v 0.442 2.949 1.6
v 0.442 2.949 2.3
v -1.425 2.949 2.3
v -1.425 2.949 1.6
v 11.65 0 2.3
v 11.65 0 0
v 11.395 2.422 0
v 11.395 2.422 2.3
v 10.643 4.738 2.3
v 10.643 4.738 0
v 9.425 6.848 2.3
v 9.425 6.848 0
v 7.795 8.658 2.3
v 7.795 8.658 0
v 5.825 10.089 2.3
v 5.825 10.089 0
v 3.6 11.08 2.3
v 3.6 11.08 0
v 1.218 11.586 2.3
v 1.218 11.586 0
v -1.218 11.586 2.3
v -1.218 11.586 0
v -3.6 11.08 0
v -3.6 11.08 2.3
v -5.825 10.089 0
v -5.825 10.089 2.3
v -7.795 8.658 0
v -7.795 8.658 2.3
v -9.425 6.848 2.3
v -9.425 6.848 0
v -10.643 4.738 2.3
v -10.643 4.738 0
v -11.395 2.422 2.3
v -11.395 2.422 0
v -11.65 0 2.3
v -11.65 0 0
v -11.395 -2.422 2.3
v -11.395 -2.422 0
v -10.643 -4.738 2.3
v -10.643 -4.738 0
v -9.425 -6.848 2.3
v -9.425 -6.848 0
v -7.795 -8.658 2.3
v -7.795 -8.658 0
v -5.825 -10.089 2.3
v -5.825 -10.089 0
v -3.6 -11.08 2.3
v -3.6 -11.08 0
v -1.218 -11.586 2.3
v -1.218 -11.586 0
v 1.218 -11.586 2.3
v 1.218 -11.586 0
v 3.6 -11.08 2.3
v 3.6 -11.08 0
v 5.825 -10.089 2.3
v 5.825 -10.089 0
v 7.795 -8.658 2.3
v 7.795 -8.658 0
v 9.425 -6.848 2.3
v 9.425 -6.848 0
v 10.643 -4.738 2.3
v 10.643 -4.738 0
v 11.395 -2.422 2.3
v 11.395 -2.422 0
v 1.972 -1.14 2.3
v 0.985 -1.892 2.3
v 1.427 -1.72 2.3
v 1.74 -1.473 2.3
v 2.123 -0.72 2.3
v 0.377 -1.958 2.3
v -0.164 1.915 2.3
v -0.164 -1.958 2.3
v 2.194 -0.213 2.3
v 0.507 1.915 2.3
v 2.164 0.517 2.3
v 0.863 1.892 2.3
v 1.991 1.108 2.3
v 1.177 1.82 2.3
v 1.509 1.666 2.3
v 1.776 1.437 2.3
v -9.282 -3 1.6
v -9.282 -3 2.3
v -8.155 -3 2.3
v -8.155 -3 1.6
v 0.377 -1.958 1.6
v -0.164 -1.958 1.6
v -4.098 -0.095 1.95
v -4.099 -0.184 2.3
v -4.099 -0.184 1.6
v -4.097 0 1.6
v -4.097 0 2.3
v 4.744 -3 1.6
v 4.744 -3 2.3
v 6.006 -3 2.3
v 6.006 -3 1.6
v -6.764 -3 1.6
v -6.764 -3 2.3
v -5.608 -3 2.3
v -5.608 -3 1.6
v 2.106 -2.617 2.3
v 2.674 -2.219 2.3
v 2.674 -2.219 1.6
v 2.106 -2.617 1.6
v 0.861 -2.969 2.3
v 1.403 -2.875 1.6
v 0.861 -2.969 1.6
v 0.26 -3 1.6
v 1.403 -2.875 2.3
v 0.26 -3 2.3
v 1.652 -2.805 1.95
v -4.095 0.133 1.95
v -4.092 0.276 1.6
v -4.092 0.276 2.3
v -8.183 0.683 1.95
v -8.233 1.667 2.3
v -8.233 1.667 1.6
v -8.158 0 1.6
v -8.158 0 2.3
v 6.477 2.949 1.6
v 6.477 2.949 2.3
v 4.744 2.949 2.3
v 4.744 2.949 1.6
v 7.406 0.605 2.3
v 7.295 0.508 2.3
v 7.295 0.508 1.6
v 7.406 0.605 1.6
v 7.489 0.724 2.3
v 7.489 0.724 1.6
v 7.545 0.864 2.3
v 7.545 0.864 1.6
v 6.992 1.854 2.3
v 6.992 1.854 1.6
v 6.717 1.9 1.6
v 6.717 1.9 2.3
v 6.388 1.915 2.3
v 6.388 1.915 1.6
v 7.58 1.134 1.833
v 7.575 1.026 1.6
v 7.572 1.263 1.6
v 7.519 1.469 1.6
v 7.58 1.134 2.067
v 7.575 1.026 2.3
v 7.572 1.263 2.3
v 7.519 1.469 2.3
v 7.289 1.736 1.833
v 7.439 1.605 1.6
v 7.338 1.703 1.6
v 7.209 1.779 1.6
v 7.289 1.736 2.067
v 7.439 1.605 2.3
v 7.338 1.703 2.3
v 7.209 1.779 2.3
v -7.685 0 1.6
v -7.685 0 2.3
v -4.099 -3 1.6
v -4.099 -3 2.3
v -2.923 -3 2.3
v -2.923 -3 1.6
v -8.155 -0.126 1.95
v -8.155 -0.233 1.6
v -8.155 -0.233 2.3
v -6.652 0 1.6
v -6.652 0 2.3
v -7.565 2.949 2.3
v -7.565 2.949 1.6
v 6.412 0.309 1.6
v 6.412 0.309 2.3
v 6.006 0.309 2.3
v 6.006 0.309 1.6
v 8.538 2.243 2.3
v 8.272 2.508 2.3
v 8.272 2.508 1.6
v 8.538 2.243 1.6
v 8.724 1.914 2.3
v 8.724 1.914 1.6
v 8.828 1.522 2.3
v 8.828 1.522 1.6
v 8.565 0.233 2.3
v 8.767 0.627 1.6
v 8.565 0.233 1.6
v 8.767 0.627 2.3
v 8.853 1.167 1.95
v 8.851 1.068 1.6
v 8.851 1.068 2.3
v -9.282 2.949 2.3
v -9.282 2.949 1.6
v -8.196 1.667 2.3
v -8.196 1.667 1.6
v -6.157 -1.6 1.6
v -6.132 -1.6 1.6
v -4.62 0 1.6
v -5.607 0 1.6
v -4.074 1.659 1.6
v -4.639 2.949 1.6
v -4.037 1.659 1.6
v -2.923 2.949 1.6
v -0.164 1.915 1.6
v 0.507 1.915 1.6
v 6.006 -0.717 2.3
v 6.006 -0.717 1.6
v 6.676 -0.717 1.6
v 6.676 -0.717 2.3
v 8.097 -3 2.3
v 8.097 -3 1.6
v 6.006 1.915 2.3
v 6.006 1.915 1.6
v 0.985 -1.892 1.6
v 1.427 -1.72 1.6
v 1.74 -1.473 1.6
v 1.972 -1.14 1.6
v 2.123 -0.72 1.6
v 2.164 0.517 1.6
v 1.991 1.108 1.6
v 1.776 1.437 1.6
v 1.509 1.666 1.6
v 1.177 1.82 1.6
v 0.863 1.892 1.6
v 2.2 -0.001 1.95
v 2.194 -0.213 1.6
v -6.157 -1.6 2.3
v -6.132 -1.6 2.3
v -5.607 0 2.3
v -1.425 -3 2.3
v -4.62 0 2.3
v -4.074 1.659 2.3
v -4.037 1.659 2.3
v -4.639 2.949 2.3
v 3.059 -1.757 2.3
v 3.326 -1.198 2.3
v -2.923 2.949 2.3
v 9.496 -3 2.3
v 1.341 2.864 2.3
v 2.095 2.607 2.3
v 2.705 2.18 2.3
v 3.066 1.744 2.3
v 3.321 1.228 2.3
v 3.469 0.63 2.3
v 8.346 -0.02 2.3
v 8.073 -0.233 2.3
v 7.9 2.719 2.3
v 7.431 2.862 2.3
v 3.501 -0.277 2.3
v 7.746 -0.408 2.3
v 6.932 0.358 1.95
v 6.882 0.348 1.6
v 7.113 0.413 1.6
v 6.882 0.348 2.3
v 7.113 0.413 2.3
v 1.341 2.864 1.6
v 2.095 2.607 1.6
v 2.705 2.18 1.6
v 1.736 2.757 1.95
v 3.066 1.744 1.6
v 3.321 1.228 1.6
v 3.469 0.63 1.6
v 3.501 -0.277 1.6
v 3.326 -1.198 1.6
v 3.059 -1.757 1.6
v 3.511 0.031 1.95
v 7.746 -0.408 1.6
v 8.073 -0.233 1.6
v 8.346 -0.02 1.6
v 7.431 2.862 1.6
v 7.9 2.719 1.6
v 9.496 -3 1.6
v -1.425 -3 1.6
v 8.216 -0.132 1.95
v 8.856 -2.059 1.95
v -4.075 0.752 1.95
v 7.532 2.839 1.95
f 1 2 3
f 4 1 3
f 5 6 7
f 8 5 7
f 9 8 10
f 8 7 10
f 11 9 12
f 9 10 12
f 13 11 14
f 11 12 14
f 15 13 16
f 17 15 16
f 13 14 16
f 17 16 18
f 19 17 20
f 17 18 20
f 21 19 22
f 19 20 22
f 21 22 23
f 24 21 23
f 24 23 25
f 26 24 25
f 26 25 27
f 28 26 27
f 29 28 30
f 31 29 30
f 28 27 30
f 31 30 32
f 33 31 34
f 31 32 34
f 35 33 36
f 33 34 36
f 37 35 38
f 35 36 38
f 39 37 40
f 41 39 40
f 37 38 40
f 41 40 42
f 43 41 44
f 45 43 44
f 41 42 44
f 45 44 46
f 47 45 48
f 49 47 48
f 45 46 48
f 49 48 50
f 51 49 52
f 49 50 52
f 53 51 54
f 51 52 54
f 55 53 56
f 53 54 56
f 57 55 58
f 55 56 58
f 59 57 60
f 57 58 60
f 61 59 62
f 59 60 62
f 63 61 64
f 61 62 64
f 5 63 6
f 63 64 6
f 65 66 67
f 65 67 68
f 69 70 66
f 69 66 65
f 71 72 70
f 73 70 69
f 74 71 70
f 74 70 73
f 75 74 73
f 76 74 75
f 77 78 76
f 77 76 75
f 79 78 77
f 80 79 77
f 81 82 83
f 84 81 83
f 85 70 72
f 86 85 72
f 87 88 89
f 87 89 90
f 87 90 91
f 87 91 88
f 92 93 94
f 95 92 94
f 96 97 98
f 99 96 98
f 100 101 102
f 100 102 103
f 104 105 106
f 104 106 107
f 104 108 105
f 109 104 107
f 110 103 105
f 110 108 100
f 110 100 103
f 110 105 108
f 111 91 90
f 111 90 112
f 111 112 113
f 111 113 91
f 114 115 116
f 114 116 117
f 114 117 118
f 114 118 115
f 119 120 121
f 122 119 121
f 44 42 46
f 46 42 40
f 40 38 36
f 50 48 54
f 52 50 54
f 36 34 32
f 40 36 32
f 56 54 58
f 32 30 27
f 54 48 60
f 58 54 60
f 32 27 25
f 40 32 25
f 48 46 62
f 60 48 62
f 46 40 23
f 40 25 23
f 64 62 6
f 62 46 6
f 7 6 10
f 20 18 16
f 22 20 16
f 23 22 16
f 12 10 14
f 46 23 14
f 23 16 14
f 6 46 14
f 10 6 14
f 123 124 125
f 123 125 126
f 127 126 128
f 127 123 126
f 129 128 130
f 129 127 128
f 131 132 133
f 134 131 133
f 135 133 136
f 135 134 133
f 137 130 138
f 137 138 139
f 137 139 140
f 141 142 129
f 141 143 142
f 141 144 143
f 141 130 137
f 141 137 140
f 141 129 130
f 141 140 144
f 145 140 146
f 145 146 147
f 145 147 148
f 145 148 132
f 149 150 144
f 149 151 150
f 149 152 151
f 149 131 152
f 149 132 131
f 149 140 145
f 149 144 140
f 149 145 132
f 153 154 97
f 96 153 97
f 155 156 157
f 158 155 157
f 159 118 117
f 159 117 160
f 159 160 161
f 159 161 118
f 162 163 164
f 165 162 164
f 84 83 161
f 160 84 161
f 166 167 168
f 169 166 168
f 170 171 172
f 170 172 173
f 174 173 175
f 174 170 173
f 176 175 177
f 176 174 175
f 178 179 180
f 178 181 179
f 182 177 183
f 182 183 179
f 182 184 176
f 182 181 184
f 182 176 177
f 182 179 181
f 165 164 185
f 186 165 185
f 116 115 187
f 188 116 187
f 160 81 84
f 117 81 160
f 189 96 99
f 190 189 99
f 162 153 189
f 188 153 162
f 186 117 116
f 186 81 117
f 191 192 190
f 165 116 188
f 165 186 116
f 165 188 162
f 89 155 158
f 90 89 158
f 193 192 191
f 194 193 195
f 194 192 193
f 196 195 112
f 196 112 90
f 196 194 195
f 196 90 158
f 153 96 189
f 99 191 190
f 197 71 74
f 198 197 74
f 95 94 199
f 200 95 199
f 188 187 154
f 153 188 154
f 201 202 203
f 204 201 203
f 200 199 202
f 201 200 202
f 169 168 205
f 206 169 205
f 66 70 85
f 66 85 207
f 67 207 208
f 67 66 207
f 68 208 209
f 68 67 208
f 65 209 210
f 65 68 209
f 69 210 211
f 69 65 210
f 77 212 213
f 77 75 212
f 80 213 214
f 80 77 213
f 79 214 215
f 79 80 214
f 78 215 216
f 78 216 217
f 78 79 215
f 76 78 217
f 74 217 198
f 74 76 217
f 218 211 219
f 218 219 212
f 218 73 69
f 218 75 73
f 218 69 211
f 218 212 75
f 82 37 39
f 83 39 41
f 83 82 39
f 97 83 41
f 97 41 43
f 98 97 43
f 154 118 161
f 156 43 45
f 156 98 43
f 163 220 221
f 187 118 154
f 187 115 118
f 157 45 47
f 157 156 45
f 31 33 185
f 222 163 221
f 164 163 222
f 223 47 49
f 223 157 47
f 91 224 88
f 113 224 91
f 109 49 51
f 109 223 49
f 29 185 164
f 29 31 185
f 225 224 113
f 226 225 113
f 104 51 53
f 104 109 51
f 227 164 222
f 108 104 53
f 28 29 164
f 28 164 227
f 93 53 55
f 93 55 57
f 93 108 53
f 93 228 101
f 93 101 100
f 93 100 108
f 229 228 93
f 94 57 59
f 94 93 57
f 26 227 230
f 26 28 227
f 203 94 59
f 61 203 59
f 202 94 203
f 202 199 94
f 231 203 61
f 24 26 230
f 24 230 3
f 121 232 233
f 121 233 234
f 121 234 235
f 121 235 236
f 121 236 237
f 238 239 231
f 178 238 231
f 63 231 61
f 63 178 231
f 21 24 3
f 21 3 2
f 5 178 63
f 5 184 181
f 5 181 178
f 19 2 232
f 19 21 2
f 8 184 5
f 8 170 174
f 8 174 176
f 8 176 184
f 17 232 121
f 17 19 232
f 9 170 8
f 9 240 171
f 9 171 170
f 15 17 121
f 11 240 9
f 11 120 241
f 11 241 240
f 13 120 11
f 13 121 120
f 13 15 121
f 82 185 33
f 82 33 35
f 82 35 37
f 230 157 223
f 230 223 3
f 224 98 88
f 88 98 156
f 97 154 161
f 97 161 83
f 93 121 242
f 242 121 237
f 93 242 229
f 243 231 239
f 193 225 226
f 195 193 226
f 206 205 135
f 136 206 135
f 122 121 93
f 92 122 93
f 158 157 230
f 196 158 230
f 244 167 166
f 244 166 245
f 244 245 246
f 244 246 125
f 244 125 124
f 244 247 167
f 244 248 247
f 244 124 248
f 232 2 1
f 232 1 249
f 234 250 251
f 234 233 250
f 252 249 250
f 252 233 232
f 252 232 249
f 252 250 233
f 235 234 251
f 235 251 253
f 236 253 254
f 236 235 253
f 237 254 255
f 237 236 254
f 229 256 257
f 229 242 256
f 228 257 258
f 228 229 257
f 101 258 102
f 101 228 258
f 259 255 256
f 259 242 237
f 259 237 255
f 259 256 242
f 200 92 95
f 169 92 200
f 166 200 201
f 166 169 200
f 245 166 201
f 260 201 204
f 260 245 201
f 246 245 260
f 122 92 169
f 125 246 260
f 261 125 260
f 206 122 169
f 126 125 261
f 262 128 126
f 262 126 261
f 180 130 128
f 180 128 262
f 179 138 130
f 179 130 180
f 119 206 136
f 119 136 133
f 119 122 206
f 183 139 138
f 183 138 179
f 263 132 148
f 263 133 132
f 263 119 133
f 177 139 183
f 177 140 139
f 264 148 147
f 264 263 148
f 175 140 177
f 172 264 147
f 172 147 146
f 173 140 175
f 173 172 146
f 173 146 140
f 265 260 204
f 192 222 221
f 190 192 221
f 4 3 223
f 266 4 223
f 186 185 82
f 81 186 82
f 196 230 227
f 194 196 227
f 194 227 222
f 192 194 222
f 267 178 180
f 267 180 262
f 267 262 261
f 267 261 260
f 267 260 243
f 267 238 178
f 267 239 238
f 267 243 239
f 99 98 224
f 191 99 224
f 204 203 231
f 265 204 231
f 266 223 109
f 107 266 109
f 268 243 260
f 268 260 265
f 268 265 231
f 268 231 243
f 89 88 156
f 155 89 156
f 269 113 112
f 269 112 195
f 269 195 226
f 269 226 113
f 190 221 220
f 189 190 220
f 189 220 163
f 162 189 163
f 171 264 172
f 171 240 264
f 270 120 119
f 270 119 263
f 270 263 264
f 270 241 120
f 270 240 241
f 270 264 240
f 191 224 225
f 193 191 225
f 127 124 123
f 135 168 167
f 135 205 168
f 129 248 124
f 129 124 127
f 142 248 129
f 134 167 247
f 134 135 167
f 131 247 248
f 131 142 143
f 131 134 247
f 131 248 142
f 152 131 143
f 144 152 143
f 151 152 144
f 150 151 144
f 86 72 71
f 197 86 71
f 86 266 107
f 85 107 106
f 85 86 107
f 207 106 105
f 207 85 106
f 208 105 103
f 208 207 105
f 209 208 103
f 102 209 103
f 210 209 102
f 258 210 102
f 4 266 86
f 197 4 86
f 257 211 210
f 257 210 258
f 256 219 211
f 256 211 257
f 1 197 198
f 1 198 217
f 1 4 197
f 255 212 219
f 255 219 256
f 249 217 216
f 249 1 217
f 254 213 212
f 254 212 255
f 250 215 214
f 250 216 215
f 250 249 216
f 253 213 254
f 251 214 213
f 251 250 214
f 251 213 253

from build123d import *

# Parameters (mm, degrees)
F0_R     = 11.65
F1_DEPTH = 2.3
F3_DEPTH = 0.7


with BuildPart() as f1:
    # F0 (on Top) → F1 (new body)
    with BuildSketch(Plane.XY):
        Circle(F0_R)
    extrude(amount=F1_DEPTH)

    # F2 (on face) → F3 (cut)
    with BuildSketch(Plane.XY.offset(2.3)):
        with BuildLine():
            Line((-9.2821657193, 2.94921875), (-9.2821657193, 0))
            Line((-9.2821657193, 0), (-8.1577947596, 0))
            add(Edge.make_bspline(
                [(-8.2326865526, 1.6666666667), (-8.1704547679, 0.5330109879), (-8.1577947596, 0)],
                knots=[0, 0, 0, 0.7965668448, 0.7965668448, 0.7965668448], degree=2))
            Line((-8.2326865526, 1.6666666667), (-8.1962282193, 1.6666666667))
            Line((-8.1962282193, 1.6666666667), (-7.6846954812, 0))
            Line((-7.6846954812, 0), (-6.6522663233, 0))
            Line((-6.6522663233, 0), (-7.5647178026, 2.94921875))
            Line((-7.5647178026, 2.94921875), (-9.2821657193, 2.94921875))
        make_face()
        with BuildLine():
            Line((-8.1577947596, 0), (-9.2821657193, 0))
            Line((-9.2821657193, 0), (-9.2821657193, -3))
            Line((-9.2821657193, -3), (-8.1545615526, -3))
            Line((-8.1545615526, -3), (-8.1545615526, -0.2330729167))
            add(Edge.make_bspline(
                [(-8.1577947596, 0), (-8.1545615526, -0.1361243036), (-8.1545615526, -0.2330729167)],
                knots=[0.7965668448, 0.7965668448, 0.7965668448, 1, 1, 1], degree=2))
        make_face()
        Polygon((-5.6076865526, -3), (-4.6199839255, 0), (-5.607097373, 0), (-6.132426136, -1.6002604167), (-6.1571657193, -1.6002604167), (-6.6522663233, 0), (-7.6846954812, 0), (-6.7639365526, -3), align=None)
        with BuildLine():
            Line((-4.0973563741, 0), (-2.9227907193, 0))
            Line((-2.9227907193, 0), (-2.9227907193, 2.94921875))
            Line((-2.9227907193, 2.94921875), (-4.6389365526, 2.94921875))
            Line((-4.6389365526, 2.94921875), (-5.607097373, 0))
            Line((-5.607097373, 0), (-4.6199839255, 0))
            Line((-4.6199839255, 0), (-4.073832386, 1.6588541667))
            Line((-4.073832386, 1.6588541667), (-4.0373740526, 1.6588541667))
            add(Edge.make_bspline(
                [(-4.0920615526, 0.2760416667), (-4.085551136, 0.5364583333), (-4.0373740526, 1.6588541667)],
                knots=[0, 0, 0, 1, 1, 1], degree=2))
            add(Edge.make_bspline(
                [(-4.0973563741, 0), (-4.0957587805, 0.1281525523), (-4.0920615526, 0.2760416667)],
                knots=[0.432105801, 0.432105801, 0.432105801, 1, 1, 1], degree=2))
        make_face()
        with BuildLine():
            Line((-2.9227907193, -3), (-2.9227907193, 0))
            Line((-2.9227907193, 0), (-4.0973563741, 0))
            add(Edge.make_bspline(
                [(-4.0985719693, -0.18359375), (-4.0985719693, -0.0975101725), (-4.0973563741, 0)],
                knots=[0, 0, 0, 0.432105801, 0.432105801, 0.432105801], degree=2))
            Line((-4.0985719693, -0.18359375), (-4.0985719693, -3))
            Line((-4.0985719693, -3), (-2.9227907193, -3))
        make_face()
        Polygon((-1.425394886, 0), (-0.163676136, 0), (-0.163676136, 1.9153645833), (0, 1.9153645833), (0, 2.94921875), (-1.425394886, 2.94921875), align=None)
        with BuildLine():
            Line((-0.163676136, -1.9583333333), (-0.163676136, 0))
            Line((-0.163676136, 0), (-1.425394886, 0))
            Line((-1.425394886, 0), (-1.425394886, -3))
            Line((-1.425394886, -3), (0.2595009474, -3))
            add(Edge.make_bspline(
                [(2.674214489, -2.21875), (1.8376259474, -3), (0.2595009474, -3)],
                knots=[0, 0, 0, 1, 1, 1], degree=2))
            add(Edge.make_bspline(
                [(3.5108030307, 0.03125), (3.5108030307, -1.4375), (2.674214489, -2.21875)],
                knots=[0, 0, 0, 1, 1, 1], degree=2))
            add(Edge.make_bspline(
                [(2.7048134474, 2.1803385417), (3.5108030307, 1.4114583333), (3.5108030307, 0.03125)],
                knots=[0, 0, 0, 1, 1, 1], degree=2))
            add(Edge.make_bspline(
                [(0.441792614, 2.94921875), (1.898823864, 2.94921875), (2.7048134474, 2.1803385417)],
                knots=[0, 0, 0, 1, 1, 1], degree=2))
            Line((0.441792614, 2.94921875), (0, 2.94921875))
            Line((0, 2.94921875), (0, 1.9153645833))
            Line((0, 1.9153645833), (0.5068967807, 1.9153645833))
            add(Edge.make_bspline(
                [(2.199605114, -0.0013020833), (2.199605114, 1.9153645833), (0.5068967807, 1.9153645833)],
                knots=[0, 0, 0, 1, 1, 1], degree=2))
            add(Edge.make_bspline(
                [(0.3766884474, -1.9583333333), (2.199605114, -1.9583333333), (2.199605114, -0.0013020833)],
                knots=[0, 0, 0, 1, 1, 1], degree=2))
            Line((0.3766884474, -1.9583333333), (-0.163676136, -1.9583333333))
        make_face()
        with BuildLine():
            Line((6.0055946974, -3), (6.0055946974, -0.7174479167))
            Line((6.0055946974, -0.7174479167), (6.676167614, -0.7174479167))
            Line((6.676167614, -0.7174479167), (8.0967405307, -3))
            Line((8.0967405307, -3), (9.496480114, -3))
            add(Edge.make_bspline(
                [(7.746480114, -0.4075520833), (9.090230114, -2.4140625), (9.496480114, -3)],
                knots=[0, 0, 0, 1, 1, 1], degree=2))
            add(Edge.make_bspline(
                [(8.564839489, 0.2330729167), (8.2764280307, -0.17578125), (7.746480114, -0.4075520833)],
                knots=[0, 0, 0, 1, 1, 1], degree=2))
            add(Edge.make_bspline(
                [(8.8532509474, 1.1666666667), (8.8532509474, 0.6419270833), (8.564839489, 0.2330729167)],
                knots=[0, 0, 0, 1, 1, 1], degree=2))
            add(Edge.make_bspline(
                [(8.271870739, 2.5078125), (8.8532509474, 2.06640625), (8.8532509474, 1.1666666667)],
                knots=[0, 0, 0, 1, 1, 1], degree=2))
            add(Edge.make_bspline(
                [(6.476948864, 2.94921875), (7.6904905307, 2.94921875), (8.271870739, 2.5078125)],
                knots=[0, 0, 0, 1, 1, 1], degree=2))
            Line((6.476948864, 2.94921875), (4.7438759474, 2.94921875))
            Line((4.7438759474, 2.94921875), (4.7438759474, -3))
            Line((4.7438759474, -3), (6.0055946974, -3))
        make_face()
        with BuildLine():
            Line((6.4118446974, 0.30859375), (6.0055946974, 0.30859375))
            Line((6.0055946974, 0.30859375), (6.0055946974, 1.9153645833))
            Line((6.0055946974, 1.9153645833), (6.3884071974, 1.9153645833))
            add(Edge.make_bspline(
                [(7.2887978224, 1.736328125), (6.9977821974, 1.9153645833), (6.3884071974, 1.9153645833)],
                knots=[0, 0, 0, 1, 1, 1], degree=2))
            add(Edge.make_bspline(
                [(7.5798134474, 1.1341145833), (7.5798134474, 1.5572916667), (7.2887978224, 1.736328125)],
                knots=[0, 0, 0, 1, 1, 1], degree=2))
            add(Edge.make_bspline(
                [(7.295308239, 0.5078125), (7.5798134474, 0.70703125), (7.5798134474, 1.1341145833)],
                knots=[0, 0, 0, 1, 1, 1], degree=2))
            add(Edge.make_bspline(
                [(6.4118446974, 0.30859375), (7.0108030307, 0.30859375), (7.295308239, 0.5078125)],
                knots=[0, 0, 0, 1, 1, 1], degree=2))
        make_face(mode=Mode.SUBTRACT)
    extrude(amount=-F3_DEPTH, mode=Mode.SUBTRACT)


solid = f1.part
